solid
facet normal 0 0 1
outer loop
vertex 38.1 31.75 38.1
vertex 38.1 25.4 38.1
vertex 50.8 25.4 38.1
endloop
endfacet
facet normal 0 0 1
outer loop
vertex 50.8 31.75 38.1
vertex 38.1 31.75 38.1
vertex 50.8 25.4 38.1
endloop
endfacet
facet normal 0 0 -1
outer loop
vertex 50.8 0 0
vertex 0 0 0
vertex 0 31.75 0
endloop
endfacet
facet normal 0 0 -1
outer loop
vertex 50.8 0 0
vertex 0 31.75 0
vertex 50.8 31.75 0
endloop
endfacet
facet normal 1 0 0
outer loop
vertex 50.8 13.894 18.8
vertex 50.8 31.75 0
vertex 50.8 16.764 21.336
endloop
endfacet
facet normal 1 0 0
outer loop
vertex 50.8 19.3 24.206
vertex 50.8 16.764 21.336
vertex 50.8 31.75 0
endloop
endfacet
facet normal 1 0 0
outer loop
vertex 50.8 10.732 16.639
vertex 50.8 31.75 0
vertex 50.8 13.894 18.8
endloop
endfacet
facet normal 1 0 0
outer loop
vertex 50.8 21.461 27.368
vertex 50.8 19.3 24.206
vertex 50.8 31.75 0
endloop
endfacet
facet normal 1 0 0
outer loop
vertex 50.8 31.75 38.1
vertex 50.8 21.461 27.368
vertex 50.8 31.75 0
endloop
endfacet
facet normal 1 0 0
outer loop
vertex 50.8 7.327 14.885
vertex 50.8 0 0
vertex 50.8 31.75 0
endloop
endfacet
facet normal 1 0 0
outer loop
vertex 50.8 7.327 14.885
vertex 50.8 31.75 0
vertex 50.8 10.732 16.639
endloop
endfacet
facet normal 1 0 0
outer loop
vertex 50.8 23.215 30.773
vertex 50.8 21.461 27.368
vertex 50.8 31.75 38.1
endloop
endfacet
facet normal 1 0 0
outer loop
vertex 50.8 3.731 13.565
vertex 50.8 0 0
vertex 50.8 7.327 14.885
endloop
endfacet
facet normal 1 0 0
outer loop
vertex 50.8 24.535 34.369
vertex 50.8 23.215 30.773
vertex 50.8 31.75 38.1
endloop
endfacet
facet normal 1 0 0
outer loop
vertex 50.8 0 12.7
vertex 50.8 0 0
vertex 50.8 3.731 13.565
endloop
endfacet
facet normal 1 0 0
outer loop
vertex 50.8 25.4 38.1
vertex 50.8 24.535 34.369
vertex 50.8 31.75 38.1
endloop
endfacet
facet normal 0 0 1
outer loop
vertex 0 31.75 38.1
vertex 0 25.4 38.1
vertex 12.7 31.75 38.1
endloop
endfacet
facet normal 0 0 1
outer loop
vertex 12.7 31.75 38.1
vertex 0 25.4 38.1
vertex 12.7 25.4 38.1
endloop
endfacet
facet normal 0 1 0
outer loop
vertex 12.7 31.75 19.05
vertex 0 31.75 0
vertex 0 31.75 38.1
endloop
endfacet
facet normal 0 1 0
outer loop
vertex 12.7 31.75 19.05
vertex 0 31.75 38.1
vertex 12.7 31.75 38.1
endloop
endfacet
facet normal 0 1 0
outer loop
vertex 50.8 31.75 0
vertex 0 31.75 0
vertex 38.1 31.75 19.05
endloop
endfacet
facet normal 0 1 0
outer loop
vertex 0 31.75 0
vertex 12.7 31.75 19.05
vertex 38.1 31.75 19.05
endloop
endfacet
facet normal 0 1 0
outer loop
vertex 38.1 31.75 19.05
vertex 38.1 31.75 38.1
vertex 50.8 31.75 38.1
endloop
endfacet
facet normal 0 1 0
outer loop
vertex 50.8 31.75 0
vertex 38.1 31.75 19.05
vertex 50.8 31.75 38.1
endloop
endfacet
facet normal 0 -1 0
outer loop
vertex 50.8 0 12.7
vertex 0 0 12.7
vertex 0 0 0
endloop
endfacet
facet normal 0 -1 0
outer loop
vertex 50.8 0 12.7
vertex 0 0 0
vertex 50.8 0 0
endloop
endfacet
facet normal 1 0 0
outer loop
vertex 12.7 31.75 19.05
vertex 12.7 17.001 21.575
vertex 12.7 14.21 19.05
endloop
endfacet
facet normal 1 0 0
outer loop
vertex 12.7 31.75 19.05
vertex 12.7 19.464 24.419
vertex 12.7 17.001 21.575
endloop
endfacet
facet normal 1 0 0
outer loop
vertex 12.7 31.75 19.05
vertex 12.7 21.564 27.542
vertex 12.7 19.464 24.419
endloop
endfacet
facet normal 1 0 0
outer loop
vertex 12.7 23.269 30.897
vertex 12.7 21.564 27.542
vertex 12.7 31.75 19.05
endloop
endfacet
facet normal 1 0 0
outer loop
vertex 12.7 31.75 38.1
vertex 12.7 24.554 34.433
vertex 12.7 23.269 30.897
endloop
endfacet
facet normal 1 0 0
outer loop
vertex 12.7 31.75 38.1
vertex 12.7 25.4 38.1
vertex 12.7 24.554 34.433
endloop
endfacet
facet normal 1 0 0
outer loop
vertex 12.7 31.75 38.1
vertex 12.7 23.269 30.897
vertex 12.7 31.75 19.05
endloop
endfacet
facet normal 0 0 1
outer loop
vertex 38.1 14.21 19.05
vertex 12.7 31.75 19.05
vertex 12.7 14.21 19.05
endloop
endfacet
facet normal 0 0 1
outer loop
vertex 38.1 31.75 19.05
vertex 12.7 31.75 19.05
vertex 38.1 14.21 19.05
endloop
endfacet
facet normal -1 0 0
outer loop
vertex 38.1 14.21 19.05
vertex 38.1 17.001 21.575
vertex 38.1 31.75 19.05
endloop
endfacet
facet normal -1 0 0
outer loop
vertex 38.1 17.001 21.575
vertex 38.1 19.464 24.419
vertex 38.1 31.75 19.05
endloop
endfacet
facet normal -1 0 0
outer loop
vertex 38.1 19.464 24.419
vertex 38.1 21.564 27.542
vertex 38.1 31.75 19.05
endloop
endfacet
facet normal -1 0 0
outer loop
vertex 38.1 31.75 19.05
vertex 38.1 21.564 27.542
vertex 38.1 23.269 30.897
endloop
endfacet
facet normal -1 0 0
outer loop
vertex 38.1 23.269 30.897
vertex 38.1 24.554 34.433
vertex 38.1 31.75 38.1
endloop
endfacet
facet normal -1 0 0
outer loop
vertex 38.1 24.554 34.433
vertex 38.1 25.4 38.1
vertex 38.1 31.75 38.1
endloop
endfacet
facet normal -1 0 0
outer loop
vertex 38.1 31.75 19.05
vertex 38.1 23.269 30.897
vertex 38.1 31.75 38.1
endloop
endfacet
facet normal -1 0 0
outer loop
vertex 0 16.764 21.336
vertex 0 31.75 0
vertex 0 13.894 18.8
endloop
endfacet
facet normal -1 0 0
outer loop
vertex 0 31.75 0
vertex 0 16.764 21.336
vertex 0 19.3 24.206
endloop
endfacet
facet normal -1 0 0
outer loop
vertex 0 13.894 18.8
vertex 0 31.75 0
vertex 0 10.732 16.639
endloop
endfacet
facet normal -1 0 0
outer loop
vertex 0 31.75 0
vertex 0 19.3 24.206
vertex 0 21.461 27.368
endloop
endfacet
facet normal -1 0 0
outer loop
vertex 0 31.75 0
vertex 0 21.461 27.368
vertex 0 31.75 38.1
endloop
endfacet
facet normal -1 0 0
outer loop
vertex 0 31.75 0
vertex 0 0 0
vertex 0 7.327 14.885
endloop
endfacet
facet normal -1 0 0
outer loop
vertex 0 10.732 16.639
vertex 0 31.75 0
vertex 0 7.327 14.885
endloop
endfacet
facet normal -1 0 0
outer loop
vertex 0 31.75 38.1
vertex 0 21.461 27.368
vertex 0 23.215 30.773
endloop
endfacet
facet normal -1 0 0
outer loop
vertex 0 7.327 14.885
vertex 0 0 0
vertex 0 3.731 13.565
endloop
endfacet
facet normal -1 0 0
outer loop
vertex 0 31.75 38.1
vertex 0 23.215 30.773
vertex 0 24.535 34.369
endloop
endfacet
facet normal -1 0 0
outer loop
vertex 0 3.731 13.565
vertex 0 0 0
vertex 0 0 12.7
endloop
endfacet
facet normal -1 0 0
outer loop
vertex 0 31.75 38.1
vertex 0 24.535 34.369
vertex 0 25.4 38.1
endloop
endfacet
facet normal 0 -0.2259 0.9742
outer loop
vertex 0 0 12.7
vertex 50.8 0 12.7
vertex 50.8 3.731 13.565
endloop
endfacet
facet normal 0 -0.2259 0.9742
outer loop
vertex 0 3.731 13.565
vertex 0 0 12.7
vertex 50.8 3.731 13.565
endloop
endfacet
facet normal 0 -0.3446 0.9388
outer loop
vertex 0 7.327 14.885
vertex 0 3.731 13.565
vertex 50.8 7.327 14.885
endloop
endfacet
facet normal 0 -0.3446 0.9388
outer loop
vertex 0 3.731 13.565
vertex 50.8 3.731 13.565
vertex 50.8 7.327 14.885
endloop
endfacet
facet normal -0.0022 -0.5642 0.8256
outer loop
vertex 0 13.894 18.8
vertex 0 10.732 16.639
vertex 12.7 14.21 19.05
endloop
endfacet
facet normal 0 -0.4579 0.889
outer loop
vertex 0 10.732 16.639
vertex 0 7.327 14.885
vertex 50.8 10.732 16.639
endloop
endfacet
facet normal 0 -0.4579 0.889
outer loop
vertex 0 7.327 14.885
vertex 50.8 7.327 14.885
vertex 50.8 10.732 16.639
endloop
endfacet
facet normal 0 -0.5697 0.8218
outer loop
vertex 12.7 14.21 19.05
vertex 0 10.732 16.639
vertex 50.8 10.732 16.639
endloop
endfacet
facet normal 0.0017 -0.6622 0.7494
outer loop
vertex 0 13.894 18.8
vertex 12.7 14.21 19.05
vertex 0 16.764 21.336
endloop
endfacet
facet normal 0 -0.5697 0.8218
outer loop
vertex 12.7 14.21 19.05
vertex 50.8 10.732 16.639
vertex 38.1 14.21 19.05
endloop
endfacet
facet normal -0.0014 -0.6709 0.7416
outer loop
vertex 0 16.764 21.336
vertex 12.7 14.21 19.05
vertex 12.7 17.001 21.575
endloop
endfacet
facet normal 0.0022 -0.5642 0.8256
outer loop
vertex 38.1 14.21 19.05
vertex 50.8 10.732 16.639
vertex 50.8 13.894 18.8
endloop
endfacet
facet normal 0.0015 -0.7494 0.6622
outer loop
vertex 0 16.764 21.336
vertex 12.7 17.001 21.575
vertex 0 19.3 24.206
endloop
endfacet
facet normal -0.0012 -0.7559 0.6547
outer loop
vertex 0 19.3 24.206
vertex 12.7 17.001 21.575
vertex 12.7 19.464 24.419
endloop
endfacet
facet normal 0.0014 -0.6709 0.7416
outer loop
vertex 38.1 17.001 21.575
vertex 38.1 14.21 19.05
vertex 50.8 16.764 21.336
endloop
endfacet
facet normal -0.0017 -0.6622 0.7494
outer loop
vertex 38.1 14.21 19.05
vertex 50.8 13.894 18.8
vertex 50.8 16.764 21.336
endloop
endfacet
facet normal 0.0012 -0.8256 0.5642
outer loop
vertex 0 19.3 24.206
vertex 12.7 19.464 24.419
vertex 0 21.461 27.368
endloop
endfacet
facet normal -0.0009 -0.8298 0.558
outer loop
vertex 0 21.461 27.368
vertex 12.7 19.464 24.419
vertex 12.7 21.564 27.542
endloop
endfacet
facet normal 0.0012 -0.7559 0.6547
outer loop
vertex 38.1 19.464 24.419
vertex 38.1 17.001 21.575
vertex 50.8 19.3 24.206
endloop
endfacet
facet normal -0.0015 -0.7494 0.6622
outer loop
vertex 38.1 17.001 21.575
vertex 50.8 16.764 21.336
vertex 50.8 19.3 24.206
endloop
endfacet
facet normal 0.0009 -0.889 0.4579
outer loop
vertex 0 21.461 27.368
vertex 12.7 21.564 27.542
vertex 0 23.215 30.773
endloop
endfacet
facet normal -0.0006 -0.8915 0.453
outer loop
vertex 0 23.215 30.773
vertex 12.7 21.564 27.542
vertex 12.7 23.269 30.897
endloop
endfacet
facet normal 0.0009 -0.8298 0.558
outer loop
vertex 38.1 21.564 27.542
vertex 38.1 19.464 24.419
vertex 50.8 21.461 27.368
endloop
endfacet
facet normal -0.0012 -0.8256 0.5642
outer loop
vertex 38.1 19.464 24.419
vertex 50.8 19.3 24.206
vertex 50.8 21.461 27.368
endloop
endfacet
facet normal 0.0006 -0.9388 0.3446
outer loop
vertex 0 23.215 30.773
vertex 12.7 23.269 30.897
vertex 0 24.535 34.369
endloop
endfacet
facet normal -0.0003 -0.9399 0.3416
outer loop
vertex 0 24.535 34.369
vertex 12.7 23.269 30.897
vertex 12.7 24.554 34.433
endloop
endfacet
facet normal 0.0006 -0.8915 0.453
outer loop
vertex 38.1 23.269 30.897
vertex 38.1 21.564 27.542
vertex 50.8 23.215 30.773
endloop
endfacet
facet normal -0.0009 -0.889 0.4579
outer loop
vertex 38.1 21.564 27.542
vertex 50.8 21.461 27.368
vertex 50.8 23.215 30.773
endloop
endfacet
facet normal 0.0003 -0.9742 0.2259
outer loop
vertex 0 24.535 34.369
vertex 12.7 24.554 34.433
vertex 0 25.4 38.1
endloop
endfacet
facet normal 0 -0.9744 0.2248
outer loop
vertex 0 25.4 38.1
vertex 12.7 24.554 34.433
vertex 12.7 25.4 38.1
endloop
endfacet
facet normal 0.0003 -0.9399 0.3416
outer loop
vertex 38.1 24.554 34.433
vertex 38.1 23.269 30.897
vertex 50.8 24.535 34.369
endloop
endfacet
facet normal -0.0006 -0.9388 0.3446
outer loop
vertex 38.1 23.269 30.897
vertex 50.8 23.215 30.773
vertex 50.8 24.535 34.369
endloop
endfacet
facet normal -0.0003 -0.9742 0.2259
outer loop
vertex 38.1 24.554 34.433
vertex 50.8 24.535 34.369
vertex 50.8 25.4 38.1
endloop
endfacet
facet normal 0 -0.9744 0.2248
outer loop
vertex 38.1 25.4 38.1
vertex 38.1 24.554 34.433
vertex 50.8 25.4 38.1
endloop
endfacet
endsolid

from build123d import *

# Parameters (mm, degrees)
F0_W     = 50.8
F0_H     = 38.1
F1_DEPTH = 31.75
F2_W     = 25.4
F2_H     = 19.05
F3_DEPTH = 19.05
F5_DEPTH = 50.8


with BuildPart() as f1:
    # F0 (on Front) → F1 (new body)
    with BuildSketch(Plane.XZ):
        with Locations((25.4, 19.05)):
            Rectangle(F0_W, F0_H)
    extrude(amount=-F1_DEPTH)

    # F2 (on face) → F3 (cut)
    with BuildSketch(Plane.XY.offset(38.1)):
        with Locations((25.4, 22.225)):
            Rectangle(F2_W, F2_H)
    extrude(amount=-F3_DEPTH, mode=Mode.SUBTRACT)

    # F4 (on face) → F5 (cut)
    with BuildSketch(Plane.YZ.offset(50.8)):
        with BuildLine():
            Line((0, 38.1), (0, 12.7))
            ThreePointArc((0, 12.7), (16.764354, 21.335646), (25.4, 38.1))
            Line((25.4, 38.1), (0, 38.1))
        make_face()
    extrude(amount=-F5_DEPTH, mode=Mode.SUBTRACT)


solid = f1.part
